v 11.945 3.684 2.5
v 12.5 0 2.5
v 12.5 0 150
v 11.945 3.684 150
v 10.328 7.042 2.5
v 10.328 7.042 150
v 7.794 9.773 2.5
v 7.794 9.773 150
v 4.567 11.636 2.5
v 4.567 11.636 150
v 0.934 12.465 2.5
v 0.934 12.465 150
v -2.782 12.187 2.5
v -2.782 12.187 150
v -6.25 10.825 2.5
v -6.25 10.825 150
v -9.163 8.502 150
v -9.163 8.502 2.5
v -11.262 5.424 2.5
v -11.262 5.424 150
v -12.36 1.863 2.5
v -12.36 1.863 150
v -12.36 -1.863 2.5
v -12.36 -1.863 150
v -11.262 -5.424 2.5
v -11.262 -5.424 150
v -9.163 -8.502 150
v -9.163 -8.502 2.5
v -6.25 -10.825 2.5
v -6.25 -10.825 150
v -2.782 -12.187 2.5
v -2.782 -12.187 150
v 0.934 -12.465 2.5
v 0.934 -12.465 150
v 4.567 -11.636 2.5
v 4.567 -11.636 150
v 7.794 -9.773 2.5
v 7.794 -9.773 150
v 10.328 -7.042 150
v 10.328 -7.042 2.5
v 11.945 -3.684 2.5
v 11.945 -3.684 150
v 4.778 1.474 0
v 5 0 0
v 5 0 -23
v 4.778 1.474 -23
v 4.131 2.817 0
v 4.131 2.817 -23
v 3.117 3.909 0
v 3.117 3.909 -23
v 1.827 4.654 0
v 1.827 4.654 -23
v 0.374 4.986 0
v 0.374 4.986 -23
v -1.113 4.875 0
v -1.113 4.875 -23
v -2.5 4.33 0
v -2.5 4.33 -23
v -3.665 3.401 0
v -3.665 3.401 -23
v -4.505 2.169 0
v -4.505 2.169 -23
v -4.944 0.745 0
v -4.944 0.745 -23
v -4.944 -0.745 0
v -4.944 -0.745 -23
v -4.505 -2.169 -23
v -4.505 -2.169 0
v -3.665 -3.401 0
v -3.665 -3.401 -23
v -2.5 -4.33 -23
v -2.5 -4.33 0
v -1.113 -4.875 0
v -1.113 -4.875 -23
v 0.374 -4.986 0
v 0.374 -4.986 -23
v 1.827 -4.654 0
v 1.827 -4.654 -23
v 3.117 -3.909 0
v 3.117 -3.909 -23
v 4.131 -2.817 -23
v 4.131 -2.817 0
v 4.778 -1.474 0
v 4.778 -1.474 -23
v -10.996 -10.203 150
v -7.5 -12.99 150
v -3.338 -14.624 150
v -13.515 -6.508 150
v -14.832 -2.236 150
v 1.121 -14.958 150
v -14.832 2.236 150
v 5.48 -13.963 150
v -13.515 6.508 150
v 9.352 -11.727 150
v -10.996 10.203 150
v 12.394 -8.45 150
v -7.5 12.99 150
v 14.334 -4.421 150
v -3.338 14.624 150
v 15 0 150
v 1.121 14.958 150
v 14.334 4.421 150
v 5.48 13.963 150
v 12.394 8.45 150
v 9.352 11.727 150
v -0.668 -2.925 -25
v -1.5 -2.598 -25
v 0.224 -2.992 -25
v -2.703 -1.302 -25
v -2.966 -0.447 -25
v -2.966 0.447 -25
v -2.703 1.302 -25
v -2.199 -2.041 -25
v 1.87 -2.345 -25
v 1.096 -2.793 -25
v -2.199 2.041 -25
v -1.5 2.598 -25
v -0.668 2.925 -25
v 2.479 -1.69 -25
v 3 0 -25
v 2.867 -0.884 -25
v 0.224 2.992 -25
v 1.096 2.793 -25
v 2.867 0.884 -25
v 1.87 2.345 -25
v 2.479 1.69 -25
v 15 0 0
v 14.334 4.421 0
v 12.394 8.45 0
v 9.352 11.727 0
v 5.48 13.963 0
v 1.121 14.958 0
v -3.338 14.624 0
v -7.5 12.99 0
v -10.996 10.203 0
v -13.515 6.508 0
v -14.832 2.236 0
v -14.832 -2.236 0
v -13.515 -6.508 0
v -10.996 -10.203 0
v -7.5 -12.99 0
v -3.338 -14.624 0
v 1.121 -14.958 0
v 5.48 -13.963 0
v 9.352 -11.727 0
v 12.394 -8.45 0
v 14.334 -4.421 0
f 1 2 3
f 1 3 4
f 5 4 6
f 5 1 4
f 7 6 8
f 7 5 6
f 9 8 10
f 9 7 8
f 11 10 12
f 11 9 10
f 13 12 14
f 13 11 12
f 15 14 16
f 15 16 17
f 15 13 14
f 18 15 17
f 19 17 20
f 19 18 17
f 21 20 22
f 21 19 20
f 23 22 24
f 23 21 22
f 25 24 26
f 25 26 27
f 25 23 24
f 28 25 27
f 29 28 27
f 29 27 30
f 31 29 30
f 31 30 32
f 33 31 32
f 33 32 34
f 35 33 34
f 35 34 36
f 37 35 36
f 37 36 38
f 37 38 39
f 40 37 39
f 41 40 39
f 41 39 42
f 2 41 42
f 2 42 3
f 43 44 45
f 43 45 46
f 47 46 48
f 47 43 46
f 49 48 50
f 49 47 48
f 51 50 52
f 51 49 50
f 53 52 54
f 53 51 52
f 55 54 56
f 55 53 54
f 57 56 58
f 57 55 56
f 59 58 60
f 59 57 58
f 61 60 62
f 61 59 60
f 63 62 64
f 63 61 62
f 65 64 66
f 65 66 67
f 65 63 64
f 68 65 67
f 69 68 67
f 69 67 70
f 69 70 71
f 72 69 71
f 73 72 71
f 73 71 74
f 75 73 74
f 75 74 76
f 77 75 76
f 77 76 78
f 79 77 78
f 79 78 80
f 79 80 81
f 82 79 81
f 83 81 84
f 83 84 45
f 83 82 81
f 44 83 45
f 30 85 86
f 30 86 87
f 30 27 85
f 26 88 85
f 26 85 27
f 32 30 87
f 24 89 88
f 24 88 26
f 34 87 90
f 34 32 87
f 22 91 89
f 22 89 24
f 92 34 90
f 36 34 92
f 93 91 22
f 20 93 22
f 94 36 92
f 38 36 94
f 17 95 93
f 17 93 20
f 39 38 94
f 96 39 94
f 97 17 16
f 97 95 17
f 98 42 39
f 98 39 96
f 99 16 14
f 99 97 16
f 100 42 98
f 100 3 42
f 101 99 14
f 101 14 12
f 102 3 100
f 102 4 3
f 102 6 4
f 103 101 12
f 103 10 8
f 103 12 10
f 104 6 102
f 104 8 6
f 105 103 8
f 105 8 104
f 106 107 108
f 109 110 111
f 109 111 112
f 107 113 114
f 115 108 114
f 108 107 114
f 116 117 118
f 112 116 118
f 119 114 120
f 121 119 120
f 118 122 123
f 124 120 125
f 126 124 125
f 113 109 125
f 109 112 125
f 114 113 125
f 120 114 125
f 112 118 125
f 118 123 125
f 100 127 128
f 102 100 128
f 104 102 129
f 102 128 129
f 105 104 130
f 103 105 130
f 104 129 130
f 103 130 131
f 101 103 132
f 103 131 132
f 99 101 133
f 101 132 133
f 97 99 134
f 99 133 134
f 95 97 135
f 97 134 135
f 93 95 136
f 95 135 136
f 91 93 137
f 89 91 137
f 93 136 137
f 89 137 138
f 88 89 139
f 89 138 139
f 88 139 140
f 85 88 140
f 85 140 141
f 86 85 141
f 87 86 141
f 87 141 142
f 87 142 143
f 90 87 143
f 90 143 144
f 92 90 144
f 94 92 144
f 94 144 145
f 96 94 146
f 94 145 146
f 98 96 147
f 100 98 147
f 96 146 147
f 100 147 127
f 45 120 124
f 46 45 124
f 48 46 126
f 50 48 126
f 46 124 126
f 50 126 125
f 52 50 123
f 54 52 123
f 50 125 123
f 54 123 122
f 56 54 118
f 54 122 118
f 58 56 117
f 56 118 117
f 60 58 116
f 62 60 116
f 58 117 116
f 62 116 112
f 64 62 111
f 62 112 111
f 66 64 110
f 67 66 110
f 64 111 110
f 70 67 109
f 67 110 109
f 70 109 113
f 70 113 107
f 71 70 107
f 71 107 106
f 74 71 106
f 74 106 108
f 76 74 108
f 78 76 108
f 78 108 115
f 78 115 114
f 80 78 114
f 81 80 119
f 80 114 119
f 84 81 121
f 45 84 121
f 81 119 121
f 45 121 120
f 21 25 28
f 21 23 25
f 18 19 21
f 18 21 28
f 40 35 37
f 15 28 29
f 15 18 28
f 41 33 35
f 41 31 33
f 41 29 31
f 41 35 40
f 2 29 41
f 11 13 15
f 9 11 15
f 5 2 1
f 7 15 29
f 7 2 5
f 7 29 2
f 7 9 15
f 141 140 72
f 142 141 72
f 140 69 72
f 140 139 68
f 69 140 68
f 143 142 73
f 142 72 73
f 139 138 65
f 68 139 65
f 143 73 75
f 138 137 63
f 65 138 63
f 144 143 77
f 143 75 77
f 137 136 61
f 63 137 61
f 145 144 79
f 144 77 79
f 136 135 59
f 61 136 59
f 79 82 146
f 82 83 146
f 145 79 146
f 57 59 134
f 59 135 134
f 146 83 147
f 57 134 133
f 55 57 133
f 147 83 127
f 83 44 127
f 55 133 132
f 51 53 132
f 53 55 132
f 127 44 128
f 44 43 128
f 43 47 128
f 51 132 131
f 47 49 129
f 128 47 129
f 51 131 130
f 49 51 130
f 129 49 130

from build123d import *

# Parameters (mm, degrees)
F0_R     = 15
F1_DEPTH = 150
F2_T     = -2.5
F3_R     = 5
F4_DEPTH = 25
F5_SIZE  = 2


with BuildPart() as f1:
    # F0 (on Top) → F1 (new body)
    with BuildSketch(Plane.XY):
        Circle(F0_R)
    extrude(amount=F1_DEPTH)

    # F2
    f2_openings = [f1.faces().sort_by_distance(p)[0] for p in [
        (0, 0, 150),
    ]]
    offset(amount=F2_T, openings=f2_openings)

    # F3 (on Top) → F4 (join)
    with BuildSketch(Plane.XY):
        Circle(F3_R)
    extrude(amount=-F4_DEPTH)

    # F5
    f5_edges = [f1.edges().sort_by_distance(p)[0] for p in [
        (-5, 0, -25),
    ]]
    chamfer(f5_edges, length=F5_SIZE)


solid = f1.part
